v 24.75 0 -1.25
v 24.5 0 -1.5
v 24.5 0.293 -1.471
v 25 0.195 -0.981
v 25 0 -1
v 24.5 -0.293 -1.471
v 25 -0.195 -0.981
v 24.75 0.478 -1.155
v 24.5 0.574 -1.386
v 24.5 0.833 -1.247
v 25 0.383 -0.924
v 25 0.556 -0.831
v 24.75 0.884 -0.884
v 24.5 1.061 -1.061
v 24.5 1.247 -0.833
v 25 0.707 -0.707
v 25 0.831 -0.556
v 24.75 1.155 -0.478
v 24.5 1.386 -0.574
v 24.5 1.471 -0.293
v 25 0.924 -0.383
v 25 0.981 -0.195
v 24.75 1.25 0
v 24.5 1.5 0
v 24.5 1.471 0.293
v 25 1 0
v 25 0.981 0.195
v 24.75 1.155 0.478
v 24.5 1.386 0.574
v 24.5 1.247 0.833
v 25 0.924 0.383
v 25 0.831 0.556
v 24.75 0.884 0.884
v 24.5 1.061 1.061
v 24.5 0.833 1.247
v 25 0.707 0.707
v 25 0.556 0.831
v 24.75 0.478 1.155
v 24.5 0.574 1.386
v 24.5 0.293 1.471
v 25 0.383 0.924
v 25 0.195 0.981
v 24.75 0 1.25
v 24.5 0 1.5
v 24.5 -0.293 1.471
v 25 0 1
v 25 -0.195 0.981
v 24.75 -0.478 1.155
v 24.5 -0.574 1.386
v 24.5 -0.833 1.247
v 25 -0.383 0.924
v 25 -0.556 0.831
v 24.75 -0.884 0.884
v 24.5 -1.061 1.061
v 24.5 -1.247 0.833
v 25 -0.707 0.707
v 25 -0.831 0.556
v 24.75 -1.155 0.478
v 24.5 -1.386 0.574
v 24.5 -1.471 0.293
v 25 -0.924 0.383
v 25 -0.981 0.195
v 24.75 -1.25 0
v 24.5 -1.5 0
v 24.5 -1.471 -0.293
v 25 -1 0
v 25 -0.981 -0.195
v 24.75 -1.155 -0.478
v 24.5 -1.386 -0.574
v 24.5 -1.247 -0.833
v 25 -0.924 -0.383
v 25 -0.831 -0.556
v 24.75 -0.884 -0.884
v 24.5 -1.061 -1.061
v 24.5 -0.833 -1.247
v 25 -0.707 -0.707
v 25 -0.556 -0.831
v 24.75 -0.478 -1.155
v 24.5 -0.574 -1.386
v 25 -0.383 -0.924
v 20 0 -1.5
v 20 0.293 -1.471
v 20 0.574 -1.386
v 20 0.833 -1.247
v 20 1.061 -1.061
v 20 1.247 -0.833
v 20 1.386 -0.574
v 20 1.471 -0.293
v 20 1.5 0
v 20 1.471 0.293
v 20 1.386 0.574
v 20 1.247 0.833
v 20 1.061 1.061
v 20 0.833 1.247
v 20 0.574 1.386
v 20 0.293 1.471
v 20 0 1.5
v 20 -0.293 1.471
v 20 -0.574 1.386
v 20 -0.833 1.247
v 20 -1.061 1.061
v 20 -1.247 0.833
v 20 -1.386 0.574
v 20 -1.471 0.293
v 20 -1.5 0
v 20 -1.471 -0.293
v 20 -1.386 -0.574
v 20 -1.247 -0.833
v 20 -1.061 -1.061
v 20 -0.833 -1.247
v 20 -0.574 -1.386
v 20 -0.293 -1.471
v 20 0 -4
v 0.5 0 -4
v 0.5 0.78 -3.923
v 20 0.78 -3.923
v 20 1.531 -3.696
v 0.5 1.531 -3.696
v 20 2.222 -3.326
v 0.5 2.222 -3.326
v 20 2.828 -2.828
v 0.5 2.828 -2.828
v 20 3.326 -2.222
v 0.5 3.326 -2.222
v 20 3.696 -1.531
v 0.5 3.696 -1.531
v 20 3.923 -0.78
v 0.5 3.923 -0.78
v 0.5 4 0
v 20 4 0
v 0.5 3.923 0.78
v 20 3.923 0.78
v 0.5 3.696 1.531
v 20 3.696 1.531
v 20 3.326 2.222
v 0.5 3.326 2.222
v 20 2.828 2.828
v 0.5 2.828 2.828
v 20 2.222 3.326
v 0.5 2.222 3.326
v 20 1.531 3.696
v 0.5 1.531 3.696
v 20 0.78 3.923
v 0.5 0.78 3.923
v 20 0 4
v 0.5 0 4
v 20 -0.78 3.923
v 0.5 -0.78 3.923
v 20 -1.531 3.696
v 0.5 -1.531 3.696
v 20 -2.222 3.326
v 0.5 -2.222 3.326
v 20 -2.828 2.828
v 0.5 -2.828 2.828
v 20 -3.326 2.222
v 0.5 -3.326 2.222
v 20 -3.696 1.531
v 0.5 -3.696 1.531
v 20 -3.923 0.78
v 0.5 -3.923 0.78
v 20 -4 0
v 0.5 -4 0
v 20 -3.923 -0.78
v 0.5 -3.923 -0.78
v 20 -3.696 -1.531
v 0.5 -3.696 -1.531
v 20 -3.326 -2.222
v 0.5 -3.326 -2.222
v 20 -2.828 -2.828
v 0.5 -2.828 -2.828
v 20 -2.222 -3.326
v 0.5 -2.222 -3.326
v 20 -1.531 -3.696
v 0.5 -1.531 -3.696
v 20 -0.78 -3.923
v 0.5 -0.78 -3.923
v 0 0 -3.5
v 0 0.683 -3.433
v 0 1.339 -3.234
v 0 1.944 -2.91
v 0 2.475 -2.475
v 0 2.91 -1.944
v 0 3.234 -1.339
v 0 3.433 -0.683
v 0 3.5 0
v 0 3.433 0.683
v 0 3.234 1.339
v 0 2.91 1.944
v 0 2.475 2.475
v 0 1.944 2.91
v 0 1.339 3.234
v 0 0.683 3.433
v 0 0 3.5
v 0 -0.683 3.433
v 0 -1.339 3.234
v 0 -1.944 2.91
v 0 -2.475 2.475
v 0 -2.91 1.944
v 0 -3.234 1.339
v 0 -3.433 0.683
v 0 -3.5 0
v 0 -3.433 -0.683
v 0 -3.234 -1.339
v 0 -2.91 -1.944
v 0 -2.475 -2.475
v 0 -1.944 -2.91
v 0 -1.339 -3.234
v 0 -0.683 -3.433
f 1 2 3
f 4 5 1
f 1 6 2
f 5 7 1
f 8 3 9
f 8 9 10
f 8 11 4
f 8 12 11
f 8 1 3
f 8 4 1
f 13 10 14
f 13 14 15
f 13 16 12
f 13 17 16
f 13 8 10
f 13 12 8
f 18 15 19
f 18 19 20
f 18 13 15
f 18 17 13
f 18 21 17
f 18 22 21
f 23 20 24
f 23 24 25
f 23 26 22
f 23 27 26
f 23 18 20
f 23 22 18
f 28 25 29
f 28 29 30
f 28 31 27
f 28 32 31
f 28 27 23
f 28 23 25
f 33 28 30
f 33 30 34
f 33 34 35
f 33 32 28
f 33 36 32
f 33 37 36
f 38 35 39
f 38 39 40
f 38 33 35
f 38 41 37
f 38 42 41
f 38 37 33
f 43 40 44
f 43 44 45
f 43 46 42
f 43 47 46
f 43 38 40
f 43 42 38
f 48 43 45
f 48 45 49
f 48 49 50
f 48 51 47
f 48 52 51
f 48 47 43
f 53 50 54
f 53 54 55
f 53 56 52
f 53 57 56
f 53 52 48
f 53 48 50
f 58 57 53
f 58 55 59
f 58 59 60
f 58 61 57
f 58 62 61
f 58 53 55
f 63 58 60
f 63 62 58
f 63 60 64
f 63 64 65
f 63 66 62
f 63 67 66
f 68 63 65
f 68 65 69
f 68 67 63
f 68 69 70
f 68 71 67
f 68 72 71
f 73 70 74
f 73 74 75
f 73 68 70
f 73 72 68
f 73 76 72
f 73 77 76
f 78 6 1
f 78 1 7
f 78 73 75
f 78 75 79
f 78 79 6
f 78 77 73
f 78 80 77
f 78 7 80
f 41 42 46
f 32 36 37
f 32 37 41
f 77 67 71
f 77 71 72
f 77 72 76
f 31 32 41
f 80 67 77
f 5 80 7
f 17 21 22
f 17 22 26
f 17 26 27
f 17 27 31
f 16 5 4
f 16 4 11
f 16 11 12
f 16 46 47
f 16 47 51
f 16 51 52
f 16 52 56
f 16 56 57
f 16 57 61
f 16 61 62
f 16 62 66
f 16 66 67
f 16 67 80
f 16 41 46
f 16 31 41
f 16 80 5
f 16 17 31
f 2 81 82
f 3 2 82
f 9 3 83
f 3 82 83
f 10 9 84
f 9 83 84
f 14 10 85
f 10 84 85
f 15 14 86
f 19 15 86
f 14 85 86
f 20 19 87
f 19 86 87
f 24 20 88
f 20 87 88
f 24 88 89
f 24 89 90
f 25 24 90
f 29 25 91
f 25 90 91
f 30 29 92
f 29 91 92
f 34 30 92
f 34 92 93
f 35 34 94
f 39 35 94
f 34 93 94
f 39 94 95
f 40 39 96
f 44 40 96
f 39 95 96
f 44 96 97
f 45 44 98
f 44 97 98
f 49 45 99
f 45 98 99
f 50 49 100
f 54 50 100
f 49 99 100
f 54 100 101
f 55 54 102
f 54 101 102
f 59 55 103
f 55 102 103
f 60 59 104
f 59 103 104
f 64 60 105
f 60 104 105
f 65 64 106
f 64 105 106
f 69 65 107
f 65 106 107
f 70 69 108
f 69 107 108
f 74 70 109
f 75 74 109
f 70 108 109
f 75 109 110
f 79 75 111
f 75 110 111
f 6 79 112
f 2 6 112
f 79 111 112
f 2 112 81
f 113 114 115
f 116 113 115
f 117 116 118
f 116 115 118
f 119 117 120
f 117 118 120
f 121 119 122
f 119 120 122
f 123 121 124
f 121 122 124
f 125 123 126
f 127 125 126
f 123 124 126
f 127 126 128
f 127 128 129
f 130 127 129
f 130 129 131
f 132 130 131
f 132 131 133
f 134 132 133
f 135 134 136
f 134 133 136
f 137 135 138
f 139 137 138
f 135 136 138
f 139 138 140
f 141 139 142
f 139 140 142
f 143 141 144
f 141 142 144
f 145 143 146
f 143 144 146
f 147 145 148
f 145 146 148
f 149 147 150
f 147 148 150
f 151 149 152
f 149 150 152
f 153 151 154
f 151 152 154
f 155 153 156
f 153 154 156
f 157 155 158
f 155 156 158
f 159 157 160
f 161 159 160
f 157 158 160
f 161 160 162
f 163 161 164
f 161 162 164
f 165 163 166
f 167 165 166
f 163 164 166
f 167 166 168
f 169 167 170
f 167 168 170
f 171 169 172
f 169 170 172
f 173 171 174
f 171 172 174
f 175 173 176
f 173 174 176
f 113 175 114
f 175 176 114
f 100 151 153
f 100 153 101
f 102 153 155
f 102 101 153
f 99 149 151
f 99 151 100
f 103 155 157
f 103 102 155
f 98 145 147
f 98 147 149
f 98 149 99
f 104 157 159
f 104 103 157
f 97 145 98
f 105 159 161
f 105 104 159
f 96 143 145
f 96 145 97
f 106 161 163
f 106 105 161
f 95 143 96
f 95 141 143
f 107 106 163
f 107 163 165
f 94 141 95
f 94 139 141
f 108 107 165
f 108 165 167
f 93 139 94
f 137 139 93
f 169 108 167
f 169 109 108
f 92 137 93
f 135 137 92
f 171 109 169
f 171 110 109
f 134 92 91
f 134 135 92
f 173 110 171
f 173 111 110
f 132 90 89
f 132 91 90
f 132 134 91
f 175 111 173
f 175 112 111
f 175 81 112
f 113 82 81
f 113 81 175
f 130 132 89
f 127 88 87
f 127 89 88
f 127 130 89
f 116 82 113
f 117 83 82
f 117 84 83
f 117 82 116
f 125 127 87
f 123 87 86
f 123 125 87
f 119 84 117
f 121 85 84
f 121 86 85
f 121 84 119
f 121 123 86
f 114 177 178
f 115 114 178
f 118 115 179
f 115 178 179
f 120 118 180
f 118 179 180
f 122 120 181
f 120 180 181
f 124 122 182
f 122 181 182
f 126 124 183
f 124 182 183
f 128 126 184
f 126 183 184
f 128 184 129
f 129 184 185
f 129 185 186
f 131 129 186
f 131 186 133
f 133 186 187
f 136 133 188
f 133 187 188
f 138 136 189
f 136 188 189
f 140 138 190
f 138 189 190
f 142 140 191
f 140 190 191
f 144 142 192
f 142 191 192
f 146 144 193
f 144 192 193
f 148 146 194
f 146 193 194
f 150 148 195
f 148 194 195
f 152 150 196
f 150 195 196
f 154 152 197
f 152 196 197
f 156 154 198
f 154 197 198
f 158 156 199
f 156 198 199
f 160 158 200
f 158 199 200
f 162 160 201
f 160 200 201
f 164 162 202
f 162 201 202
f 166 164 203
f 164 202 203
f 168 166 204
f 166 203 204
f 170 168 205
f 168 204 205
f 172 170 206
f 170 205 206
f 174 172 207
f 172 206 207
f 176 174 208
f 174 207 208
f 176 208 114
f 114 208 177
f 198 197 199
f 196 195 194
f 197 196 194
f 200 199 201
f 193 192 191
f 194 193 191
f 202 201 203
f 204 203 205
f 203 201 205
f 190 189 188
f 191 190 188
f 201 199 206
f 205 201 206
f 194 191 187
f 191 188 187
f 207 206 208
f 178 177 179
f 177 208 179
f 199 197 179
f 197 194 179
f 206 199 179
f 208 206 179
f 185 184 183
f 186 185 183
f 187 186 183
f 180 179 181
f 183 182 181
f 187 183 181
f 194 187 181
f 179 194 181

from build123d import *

# Parameters (mm, degrees)
CROQUIS1_R              = 4
SALIENTE_EXTRUIR1_DEPTH = 20
CROQUIS2_R              = 1.5
SALIENTE_EXTRUIR2_DEPTH = 5
CHAFL_N1_SIZE           = 0.5
CHAFL_N2_SIZE           = 0.5


with BuildPart() as part:
    # Croquis1 → Saliente-Extruir1 (new body)
    with BuildSketch(Plane(origin=(0, 0, 0), x_dir=(0, 0, -1), z_dir=(1, 0, 0))):
        Circle(CROQUIS1_R)
    extrude(amount=SALIENTE_EXTRUIR1_DEPTH)

    # Croquis2 → Saliente-Extruir2 (add)
    with BuildSketch(Plane(origin=(20, 0, 0), x_dir=(0, 0, -1), z_dir=(1, 0, 0))):
        Circle(CROQUIS2_R)
    extrude(amount=SALIENTE_EXTRUIR2_DEPTH)

    # Chaflán1
    chafl_n1_edges = [part.edges().sort_by_distance(p)[0] for p in [
        (0, 0, 4),
    ]]
    chamfer(chafl_n1_edges, length=CHAFL_N1_SIZE)

    # Chaflán2
    chafl_n2_edges = [part.edges().sort_by_distance(p)[0] for p in [
        (25, 0, 1.5),
    ]]
    chamfer(chafl_n2_edges, length=CHAFL_N2_SIZE)


solid = part.part
